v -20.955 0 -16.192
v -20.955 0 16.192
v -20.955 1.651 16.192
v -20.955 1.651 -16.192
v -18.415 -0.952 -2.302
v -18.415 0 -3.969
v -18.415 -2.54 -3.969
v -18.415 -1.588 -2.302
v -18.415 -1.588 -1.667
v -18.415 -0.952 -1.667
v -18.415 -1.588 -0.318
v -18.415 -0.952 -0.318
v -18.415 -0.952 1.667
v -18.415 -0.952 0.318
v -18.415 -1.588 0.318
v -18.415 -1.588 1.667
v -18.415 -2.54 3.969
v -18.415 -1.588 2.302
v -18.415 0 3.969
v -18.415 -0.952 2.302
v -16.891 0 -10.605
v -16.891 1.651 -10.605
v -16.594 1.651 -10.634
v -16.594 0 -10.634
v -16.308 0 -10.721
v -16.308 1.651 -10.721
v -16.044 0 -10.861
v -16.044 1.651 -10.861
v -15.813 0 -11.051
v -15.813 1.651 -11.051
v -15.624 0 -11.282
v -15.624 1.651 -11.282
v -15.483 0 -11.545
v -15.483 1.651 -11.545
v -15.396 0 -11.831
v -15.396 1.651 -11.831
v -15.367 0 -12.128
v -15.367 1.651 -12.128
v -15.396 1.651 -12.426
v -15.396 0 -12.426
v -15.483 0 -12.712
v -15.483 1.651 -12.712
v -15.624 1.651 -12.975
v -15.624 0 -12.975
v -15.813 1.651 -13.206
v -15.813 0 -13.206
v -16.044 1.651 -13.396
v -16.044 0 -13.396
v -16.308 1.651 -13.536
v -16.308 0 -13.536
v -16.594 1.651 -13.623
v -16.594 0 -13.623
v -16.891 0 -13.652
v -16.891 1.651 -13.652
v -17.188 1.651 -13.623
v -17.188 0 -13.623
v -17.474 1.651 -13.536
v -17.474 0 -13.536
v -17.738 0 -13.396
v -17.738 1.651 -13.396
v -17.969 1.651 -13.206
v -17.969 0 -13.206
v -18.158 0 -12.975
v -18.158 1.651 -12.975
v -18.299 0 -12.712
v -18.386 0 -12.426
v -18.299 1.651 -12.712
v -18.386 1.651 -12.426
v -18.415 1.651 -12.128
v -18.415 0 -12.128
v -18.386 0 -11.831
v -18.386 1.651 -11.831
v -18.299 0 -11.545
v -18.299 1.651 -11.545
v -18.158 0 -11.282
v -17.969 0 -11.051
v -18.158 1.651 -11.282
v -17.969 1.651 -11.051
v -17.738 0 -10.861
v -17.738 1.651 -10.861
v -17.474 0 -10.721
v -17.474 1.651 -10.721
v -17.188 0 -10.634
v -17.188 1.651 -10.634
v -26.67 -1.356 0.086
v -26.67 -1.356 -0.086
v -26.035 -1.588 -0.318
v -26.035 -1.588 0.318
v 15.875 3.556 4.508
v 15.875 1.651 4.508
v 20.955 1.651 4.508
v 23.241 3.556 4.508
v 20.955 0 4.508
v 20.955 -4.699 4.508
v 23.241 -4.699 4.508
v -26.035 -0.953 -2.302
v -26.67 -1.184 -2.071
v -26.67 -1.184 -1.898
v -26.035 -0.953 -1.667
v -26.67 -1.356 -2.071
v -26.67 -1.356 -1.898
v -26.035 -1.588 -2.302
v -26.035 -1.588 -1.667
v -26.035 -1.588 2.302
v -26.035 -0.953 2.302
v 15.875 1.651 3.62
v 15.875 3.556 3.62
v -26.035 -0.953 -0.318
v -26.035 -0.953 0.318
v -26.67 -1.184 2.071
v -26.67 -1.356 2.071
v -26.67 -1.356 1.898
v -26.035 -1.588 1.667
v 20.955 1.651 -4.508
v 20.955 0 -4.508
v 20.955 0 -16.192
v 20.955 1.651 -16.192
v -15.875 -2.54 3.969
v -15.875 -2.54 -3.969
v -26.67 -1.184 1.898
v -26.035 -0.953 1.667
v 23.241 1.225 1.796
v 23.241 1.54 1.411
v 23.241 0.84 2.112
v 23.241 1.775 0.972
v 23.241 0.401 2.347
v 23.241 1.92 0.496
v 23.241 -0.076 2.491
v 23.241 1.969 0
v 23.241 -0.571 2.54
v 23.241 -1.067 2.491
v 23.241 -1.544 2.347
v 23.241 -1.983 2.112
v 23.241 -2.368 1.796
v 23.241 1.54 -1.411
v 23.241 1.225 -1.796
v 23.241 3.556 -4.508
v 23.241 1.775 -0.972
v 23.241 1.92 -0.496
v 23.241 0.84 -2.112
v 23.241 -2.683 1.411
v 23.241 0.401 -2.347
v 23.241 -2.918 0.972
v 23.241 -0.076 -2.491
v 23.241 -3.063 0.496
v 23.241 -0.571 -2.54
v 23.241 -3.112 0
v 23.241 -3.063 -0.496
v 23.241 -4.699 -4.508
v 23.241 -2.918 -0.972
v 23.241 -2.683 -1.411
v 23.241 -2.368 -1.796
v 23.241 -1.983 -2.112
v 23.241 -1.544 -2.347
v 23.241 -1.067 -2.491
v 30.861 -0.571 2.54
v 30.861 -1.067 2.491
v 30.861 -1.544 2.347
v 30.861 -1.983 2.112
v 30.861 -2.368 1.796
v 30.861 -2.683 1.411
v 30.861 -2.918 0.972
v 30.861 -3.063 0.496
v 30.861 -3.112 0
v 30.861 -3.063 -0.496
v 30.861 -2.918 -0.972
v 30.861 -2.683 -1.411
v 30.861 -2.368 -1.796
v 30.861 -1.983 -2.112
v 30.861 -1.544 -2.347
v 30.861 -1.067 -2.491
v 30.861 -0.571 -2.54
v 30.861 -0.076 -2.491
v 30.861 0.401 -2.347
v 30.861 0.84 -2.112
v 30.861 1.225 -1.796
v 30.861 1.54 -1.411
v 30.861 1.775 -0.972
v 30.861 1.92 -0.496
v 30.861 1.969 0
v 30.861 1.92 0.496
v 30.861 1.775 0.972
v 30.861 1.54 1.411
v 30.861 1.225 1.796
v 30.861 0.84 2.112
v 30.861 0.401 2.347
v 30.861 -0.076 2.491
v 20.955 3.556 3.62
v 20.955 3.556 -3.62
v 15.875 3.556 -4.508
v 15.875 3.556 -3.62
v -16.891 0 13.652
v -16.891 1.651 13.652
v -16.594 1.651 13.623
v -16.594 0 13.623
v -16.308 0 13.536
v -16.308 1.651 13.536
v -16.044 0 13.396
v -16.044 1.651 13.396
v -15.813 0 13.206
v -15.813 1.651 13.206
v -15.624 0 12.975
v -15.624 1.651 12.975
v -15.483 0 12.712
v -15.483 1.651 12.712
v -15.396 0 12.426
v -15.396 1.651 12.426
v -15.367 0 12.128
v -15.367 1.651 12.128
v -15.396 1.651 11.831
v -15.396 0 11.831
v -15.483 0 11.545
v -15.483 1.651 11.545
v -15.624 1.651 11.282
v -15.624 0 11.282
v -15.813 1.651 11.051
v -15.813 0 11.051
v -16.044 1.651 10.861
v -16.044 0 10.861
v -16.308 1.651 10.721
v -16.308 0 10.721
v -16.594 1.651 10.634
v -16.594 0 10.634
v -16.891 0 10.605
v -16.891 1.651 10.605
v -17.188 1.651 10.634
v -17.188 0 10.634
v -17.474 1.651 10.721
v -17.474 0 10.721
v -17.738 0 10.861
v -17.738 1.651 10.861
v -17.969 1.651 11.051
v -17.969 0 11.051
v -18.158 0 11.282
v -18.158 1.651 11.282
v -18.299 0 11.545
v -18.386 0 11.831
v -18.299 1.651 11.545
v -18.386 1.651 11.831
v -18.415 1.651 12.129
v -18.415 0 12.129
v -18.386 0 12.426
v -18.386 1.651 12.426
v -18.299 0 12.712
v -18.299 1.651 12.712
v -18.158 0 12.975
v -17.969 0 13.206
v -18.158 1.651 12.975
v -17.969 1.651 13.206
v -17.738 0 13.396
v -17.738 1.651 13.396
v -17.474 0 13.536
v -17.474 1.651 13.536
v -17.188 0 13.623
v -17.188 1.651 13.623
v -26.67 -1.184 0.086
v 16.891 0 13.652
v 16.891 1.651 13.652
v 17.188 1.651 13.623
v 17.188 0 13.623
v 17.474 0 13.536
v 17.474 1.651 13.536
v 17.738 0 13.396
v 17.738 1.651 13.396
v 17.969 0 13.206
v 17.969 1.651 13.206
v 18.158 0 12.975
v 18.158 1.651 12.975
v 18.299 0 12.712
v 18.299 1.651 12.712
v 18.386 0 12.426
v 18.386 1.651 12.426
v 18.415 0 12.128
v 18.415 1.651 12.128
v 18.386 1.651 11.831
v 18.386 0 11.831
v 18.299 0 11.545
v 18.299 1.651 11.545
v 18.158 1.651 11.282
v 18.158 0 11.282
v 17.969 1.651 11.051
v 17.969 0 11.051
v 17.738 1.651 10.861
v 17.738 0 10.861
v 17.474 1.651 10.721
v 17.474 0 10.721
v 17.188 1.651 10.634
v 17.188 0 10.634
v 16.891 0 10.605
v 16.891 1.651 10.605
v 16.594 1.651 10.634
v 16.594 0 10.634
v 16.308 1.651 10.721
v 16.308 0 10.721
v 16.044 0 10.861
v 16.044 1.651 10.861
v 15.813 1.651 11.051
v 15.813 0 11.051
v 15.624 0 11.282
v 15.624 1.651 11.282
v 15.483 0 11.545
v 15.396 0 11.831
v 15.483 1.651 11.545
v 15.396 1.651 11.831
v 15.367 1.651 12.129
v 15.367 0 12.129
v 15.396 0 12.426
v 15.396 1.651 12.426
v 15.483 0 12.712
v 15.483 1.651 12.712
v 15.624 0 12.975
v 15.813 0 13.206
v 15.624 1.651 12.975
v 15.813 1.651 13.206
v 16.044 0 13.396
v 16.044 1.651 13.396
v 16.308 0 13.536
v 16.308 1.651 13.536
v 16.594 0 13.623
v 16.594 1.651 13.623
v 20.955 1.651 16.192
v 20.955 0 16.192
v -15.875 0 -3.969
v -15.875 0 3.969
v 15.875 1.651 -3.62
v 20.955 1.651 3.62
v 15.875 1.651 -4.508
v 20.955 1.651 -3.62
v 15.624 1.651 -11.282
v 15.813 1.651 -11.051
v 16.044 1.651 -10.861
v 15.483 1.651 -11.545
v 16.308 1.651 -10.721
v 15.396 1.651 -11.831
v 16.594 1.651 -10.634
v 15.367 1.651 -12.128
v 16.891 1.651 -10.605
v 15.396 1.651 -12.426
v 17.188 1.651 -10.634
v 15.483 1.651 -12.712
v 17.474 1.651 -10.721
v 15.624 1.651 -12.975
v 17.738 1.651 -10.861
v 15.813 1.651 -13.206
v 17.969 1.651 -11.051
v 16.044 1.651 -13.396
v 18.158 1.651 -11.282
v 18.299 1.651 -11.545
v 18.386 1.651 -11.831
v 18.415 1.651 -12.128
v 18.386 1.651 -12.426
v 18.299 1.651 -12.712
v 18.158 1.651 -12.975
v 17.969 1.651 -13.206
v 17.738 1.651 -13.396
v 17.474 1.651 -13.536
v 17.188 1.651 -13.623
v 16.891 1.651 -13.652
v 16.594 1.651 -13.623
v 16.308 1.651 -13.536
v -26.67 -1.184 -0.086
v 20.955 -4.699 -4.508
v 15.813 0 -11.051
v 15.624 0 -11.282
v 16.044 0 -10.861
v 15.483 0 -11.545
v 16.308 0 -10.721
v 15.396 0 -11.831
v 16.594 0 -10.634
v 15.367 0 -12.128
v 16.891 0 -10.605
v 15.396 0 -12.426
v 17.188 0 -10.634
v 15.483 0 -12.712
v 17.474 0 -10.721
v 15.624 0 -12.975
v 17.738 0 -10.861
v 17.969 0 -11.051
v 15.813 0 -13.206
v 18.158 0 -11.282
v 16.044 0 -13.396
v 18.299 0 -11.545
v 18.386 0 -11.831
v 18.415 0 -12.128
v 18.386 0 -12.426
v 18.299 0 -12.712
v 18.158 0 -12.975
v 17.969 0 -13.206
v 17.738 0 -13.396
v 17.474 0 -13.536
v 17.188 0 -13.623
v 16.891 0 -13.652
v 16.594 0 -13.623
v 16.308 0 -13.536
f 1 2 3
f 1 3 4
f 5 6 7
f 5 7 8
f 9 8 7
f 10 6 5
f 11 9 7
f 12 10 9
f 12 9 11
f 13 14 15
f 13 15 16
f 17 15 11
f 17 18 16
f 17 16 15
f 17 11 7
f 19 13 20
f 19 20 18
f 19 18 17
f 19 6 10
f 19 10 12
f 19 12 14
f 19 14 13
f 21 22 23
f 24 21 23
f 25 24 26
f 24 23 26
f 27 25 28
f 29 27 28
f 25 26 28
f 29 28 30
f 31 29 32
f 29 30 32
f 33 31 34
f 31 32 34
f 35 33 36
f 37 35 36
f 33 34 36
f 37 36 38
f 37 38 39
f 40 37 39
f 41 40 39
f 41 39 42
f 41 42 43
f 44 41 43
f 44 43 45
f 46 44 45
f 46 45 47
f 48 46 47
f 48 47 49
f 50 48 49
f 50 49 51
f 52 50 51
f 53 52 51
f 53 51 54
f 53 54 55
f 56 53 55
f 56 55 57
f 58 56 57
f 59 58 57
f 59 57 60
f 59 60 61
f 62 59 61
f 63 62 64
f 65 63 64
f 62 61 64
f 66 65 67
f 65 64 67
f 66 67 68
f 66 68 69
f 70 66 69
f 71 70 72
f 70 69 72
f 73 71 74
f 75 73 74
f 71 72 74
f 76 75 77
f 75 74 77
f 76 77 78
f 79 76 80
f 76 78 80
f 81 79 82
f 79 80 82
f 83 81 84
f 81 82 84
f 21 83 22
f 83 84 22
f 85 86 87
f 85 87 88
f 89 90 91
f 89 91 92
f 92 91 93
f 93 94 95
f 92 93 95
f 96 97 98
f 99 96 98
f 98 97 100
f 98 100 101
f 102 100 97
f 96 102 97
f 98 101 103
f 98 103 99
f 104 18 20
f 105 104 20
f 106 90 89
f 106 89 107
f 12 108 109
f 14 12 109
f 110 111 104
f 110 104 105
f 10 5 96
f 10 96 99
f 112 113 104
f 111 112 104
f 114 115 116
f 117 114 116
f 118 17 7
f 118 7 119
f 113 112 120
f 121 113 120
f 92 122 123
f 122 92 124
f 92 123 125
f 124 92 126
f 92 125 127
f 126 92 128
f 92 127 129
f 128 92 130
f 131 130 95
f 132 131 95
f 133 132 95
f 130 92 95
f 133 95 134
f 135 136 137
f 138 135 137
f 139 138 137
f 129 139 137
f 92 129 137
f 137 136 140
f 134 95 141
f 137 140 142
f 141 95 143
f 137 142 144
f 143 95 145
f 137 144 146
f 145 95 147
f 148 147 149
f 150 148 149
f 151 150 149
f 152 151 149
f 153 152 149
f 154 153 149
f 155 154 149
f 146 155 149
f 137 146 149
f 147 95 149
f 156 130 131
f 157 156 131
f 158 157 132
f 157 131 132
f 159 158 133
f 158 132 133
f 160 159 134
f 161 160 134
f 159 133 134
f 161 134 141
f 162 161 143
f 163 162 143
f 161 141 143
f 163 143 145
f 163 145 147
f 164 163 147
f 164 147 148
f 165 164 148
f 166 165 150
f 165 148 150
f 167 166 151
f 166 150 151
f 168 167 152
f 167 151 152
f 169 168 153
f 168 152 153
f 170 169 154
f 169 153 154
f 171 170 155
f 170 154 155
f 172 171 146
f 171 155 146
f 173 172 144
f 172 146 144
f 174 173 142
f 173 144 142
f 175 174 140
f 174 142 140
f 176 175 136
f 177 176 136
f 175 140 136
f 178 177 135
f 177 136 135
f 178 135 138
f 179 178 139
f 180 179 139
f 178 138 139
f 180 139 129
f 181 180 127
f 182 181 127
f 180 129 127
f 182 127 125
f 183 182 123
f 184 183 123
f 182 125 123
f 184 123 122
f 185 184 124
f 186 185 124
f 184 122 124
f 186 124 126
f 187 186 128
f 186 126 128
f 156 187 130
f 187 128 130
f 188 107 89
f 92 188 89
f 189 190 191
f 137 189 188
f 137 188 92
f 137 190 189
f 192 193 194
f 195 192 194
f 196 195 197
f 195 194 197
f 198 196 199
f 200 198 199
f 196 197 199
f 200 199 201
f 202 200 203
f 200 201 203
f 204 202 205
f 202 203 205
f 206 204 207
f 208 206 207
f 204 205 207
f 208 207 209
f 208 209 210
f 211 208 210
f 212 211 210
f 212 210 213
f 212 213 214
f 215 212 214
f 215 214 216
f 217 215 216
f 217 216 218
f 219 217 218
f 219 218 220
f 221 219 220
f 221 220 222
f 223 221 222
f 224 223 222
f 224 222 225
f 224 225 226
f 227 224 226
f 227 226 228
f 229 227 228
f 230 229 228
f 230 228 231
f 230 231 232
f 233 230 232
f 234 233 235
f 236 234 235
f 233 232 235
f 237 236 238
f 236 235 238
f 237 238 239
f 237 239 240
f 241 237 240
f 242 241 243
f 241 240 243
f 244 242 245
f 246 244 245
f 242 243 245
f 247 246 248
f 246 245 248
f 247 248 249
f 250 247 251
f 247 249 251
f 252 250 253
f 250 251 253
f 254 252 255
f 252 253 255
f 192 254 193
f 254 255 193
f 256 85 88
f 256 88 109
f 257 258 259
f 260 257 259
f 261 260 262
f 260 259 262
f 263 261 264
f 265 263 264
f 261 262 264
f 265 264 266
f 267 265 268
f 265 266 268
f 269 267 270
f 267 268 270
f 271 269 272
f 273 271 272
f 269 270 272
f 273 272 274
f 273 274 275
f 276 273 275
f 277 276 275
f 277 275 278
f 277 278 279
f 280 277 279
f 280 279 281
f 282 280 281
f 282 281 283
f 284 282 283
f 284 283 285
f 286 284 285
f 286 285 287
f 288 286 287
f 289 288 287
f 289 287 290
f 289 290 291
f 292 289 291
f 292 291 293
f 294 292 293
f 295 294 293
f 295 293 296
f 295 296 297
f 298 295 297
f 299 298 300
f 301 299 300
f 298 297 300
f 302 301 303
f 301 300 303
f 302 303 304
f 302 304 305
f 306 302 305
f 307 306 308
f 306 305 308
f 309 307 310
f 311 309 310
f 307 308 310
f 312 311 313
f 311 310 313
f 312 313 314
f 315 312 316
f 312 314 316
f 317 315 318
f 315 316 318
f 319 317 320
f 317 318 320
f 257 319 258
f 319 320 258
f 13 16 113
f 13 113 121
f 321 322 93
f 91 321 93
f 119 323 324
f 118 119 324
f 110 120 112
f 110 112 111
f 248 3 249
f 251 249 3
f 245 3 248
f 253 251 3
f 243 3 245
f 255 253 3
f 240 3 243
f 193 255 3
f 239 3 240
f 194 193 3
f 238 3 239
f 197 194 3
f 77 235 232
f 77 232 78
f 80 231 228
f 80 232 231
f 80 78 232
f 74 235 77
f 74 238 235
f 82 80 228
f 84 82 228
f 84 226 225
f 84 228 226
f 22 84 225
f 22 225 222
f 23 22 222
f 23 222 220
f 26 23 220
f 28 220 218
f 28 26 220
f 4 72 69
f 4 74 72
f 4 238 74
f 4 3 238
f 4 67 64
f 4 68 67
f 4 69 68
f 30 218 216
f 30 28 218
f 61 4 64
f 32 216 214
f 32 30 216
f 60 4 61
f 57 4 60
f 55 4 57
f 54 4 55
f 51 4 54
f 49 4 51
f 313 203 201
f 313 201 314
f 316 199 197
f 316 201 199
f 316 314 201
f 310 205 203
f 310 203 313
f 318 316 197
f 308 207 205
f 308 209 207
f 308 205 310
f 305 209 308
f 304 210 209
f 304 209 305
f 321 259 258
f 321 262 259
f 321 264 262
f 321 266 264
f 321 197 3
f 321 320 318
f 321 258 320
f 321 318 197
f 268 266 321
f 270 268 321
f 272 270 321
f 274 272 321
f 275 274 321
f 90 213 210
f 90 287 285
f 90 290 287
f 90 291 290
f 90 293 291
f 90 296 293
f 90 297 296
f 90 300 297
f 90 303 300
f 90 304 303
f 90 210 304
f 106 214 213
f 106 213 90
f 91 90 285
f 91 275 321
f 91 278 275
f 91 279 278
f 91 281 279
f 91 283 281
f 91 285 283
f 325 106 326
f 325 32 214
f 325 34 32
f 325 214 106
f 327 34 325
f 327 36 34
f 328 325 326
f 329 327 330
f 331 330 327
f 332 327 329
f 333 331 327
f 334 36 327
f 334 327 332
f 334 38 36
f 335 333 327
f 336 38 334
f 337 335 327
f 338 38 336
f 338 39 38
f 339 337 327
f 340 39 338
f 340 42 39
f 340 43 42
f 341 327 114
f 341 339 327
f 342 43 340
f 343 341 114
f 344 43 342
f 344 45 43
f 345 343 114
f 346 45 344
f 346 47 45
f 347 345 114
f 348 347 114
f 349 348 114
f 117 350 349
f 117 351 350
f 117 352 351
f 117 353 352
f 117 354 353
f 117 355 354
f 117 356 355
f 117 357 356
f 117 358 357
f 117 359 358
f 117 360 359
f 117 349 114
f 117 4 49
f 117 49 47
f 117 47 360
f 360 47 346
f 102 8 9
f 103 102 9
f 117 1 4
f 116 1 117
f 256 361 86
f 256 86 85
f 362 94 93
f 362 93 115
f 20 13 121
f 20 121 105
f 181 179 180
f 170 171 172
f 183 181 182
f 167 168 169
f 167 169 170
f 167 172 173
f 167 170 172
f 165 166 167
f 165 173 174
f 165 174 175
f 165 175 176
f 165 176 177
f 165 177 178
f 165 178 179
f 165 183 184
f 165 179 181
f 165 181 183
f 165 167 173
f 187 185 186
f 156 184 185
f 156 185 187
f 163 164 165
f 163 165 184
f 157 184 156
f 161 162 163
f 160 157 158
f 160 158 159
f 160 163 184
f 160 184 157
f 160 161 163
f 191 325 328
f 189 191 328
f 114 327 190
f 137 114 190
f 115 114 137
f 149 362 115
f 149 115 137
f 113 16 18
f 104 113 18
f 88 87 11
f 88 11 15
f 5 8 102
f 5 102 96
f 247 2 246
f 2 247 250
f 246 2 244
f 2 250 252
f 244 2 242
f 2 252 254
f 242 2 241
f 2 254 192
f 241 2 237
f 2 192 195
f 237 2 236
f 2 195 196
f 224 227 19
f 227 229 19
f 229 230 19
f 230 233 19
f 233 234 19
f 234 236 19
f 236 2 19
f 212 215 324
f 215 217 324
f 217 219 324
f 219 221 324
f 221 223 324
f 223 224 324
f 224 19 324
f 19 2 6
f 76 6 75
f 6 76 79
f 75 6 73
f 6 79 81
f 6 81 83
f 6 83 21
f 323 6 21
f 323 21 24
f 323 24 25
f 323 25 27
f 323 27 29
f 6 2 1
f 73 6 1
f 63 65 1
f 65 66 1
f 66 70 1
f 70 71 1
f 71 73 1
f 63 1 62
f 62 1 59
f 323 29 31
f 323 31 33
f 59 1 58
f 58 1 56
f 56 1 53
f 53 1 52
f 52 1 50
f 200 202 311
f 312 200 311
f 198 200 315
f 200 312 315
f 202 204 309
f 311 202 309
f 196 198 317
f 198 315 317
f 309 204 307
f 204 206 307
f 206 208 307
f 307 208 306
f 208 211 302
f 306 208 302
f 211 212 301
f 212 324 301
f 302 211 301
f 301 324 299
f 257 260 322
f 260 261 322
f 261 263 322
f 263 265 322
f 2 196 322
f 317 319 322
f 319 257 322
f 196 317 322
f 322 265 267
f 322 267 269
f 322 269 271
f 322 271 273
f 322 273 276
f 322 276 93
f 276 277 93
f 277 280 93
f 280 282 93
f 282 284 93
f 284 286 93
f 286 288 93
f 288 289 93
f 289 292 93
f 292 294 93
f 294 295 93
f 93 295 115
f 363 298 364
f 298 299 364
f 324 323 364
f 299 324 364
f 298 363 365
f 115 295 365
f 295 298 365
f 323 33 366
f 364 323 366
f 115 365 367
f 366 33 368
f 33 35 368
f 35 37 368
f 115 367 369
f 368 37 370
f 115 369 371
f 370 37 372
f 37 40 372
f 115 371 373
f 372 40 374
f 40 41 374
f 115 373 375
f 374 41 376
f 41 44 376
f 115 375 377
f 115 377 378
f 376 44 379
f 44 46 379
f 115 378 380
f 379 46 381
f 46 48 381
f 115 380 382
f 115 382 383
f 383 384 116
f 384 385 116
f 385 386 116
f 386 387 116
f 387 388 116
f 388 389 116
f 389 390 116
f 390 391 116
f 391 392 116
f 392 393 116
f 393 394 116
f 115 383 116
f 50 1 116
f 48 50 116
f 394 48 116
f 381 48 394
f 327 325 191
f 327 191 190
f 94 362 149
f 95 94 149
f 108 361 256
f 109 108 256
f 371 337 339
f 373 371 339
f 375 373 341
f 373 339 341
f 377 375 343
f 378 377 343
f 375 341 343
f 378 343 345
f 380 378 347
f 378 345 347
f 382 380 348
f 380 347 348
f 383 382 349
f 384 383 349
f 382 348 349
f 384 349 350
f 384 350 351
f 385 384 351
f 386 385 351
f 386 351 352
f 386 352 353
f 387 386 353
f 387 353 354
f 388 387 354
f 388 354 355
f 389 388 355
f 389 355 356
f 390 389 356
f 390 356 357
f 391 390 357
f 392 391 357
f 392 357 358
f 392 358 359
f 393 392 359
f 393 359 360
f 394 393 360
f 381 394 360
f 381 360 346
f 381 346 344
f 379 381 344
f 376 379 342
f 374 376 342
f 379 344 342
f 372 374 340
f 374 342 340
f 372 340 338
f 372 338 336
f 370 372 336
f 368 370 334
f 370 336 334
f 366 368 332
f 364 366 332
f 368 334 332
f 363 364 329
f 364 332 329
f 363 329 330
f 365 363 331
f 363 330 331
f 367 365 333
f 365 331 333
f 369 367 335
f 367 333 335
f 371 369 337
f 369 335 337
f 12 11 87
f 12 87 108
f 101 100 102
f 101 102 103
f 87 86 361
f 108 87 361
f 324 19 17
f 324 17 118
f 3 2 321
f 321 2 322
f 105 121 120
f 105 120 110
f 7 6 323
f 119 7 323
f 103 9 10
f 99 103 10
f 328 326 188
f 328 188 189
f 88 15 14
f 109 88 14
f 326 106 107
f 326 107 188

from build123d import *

# Parameters (mm, degrees)
SKETCH1_W                     = 41.91
SKETCH1_H                     = 32.385
BOSS_EXTRUDE1_DEPTH           = 1.651
SKETCH2_R                     = 1.524
CUT_EXTRUDE1_DEPTH            = 27.533655652
SKETCH3_W                     = 5.08
SKETCH3_H                     = 0.889
BOSS_EXTRUDE2_DEPTH           = 1.905
BOSS_EXTRUDE3_DEPTH           = 1.905
BOSS_EXTRUDE3_DEPTH_BACK      = 6.35
SKETCH4_W                     = 2.286
SKETCH4_H                     = 9.017
SKETCH5_R                     = 2.54
BOSS_EXTRUDE4_DEPTH           = 7.62
SKETCH6_W                     = 2.54
SKETCH6_H                     = 7.9375
BOSS_EXTRUDE5_DEPTH           = 2.54
SKETCH7_W                     = 0.635
SKETCH7_H                     = 0.635
BOSS_EXTRUDE6_DEPTH           = 7.62
SKETCH8_W                     = 0.635
SKETCH8_H                     = 0.635
BOSS_EXTRUDE7_DEPTH           = 0.635
BOSS_EXTRUDE7_DRAFT           = 20
BOSS_EXTRUDE7_PROFILE_2_DEPTH = 0.635
BOSS_EXTRUDE7_PROFILE_2_DRAFT = 20
BOSS_EXTRUDE7_PROFILE_3_DEPTH = 0.635
BOSS_EXTRUDE7_PROFILE_3_DRAFT = 20


with BuildPart() as part:
    # Sketch1 → Boss-Extrude1 (new body)
    with BuildSketch(Plane(origin=(0, 0, 0), x_dir=(1, 0, 0), z_dir=(0, 1, 0))):
        Rectangle(SKETCH1_W, SKETCH1_H)
    extrude(amount=BOSS_EXTRUDE1_DEPTH)

    # Sketch2 → Cut-Extrude1 (cut, through all)
    with BuildSketch(Plane(origin=(0, 1.651, 0), x_dir=(1, 0, 0), z_dir=(0, 1, 0))):
        with Locations(Location((-16.891, 12.1285, 0), (0, 0, 270))):
            Circle(SKETCH2_R)
        with Locations(Location((16.891, 12.1285, 0), (0, 0, 270))):
            Circle(SKETCH2_R)
        with Locations(Location((-16.891, -12.1285, 0), (0, 0, 270))):
            Circle(SKETCH2_R)
        with Locations(Location((16.891, -12.1285, 0), (0, 0, 270))):
            Circle(SKETCH2_R)
    extrude(amount=-CUT_EXTRUDE1_DEPTH, mode=Mode.SUBTRACT)

    # Sketch3 → Boss-Extrude2 (add)
    with BuildSketch(Plane(origin=(0, 1.651, 0), x_dir=(1, 0, 0), z_dir=(0, 1, 0))):
        with Locations((18.415, 4.064)):
            Rectangle(SKETCH3_W, SKETCH3_H)
        with Locations((18.415, -4.064)):
            Rectangle(SKETCH3_W, SKETCH3_H)
    extrude(amount=BOSS_EXTRUDE2_DEPTH)

    # Sketch4 → Boss-Extrude3 (add, two sides: drawn at the far end of the back side and taken through both)
    with BuildSketch(Plane(origin=(0, 1.651, 0), x_dir=(1, 0, 0), z_dir=(0, 1, 0)).offset(-BOSS_EXTRUDE3_DEPTH_BACK)):
        with Locations((22.098, 0)):
            Rectangle(SKETCH4_W, SKETCH4_H)
    extrude(amount=BOSS_EXTRUDE3_DEPTH + BOSS_EXTRUDE3_DEPTH_BACK)

    # Sketch5 → Boss-Extrude4 (add)
    with BuildSketch(Plane(origin=(23.241, 0, 0), x_dir=(0, 0, -1), z_dir=(1, 0, 0))):
        with Locations(Location((0, -0.5715, 0), (0, 0, 180))):
            Circle(SKETCH5_R)
    extrude(amount=BOSS_EXTRUDE4_DEPTH)

    # Sketch6 → Boss-Extrude5 (add)
    with BuildSketch(Plane.XZ):
        with Locations((-17.145, 0)):
            Rectangle(SKETCH6_W, SKETCH6_H)
    extrude(amount=BOSS_EXTRUDE5_DEPTH)

    # Sketch7 → Boss-Extrude6 (add)
    with BuildSketch(Plane.ZY.offset(18.415)):
        with Locations((1.984375, -1.27)):
            Rectangle(SKETCH7_W, SKETCH7_H)
        with Locations((0, -1.27)):
            Rectangle(SKETCH7_W, SKETCH7_H)
        with Locations((-1.984375, -1.27)):
            Rectangle(SKETCH7_W, SKETCH7_H)
    extrude(amount=BOSS_EXTRUDE6_DEPTH)


with BuildPart() as boss_extrude7_tool:
    # Sketch8 → Boss-Extrude7 (with draft: the straight prism first)
    with BuildSketch(Plane.ZY.offset(26.035)):
        with Locations((-1.984375, -1.27)):
            Rectangle(SKETCH8_W, SKETCH8_H)
    extrude(amount=BOSS_EXTRUDE7_DEPTH)
    # Boss-Extrude7: the draft: its side faces are tilted about the plane it starts from
    boss_extrude7_sides = [boss_extrude7_tool.faces().sort_by_distance(p)[0] for p in [
        (-26.3525, -1.27, -2.301875),
        (-26.3525, -1.5875, -1.984375),
        (-26.3525, -1.27, -1.666875),
        (-26.3525, -0.9525, -1.984375),
    ]]
    draft(boss_extrude7_sides, Plane.ZY.offset(26.035), BOSS_EXTRUDE7_DRAFT)


with BuildPart() as part_1:
    add(part.part)

    # Boss-Extrude7: add boss_extrude7_tool
    add(boss_extrude7_tool.part)


with BuildPart() as boss_extrude7_profile_2_tool:
    # Sketch8 → Boss-Extrude7 profile 2 (with draft: the straight prism first)
    with BuildSketch(Plane.ZY.offset(26.035)):
        with Locations((0, -1.27)):
            Rectangle(SKETCH8_W, SKETCH8_H)
    extrude(amount=BOSS_EXTRUDE7_PROFILE_2_DEPTH)
    # Boss-Extrude7 profile 2: the draft: its side faces are tilted about the plane it starts from
    boss_extrude7_profile_2_sides = [boss_extrude7_profile_2_tool.faces().sort_by_distance(p)[0] for p in [
        (-26.3525, -1.27, -0.3175),
        (-26.3525, -1.5875, 0),
        (-26.3525, -1.27, 0.3175),
        (-26.3525, -0.9525, 0),
    ]]
    draft(boss_extrude7_profile_2_sides, Plane.ZY.offset(26.035), BOSS_EXTRUDE7_PROFILE_2_DRAFT)


with BuildPart() as part_2:
    add(part_1.part)

    # Boss-Extrude7 profile 2: add boss_extrude7_profile_2_tool
    add(boss_extrude7_profile_2_tool.part)


with BuildPart() as boss_extrude7_profile_3_tool:
    # Sketch8 → Boss-Extrude7 profile 3 (with draft: the straight prism first)
    with BuildSketch(Plane.ZY.offset(26.035)):
        with Locations((1.984375, -1.27)):
            Rectangle(SKETCH8_W, SKETCH8_H)
    extrude(amount=BOSS_EXTRUDE7_PROFILE_3_DEPTH)
    # Boss-Extrude7 profile 3: the draft: its side faces are tilted about the plane it starts from
    boss_extrude7_profile_3_sides = [boss_extrude7_profile_3_tool.faces().sort_by_distance(p)[0] for p in [
        (-26.3525, -1.27, 1.666875),
        (-26.3525, -1.5875, 1.984375),
        (-26.3525, -1.27, 2.301875),
        (-26.3525, -0.9525, 1.984375),
    ]]
    draft(boss_extrude7_profile_3_sides, Plane.ZY.offset(26.035), BOSS_EXTRUDE7_PROFILE_3_DRAFT)


with BuildPart() as part_3:
    add(part_2.part)

    # Boss-Extrude7 profile 3: add boss_extrude7_profile_3_tool
    add(boss_extrude7_profile_3_tool.part)


solid = part_3.part
